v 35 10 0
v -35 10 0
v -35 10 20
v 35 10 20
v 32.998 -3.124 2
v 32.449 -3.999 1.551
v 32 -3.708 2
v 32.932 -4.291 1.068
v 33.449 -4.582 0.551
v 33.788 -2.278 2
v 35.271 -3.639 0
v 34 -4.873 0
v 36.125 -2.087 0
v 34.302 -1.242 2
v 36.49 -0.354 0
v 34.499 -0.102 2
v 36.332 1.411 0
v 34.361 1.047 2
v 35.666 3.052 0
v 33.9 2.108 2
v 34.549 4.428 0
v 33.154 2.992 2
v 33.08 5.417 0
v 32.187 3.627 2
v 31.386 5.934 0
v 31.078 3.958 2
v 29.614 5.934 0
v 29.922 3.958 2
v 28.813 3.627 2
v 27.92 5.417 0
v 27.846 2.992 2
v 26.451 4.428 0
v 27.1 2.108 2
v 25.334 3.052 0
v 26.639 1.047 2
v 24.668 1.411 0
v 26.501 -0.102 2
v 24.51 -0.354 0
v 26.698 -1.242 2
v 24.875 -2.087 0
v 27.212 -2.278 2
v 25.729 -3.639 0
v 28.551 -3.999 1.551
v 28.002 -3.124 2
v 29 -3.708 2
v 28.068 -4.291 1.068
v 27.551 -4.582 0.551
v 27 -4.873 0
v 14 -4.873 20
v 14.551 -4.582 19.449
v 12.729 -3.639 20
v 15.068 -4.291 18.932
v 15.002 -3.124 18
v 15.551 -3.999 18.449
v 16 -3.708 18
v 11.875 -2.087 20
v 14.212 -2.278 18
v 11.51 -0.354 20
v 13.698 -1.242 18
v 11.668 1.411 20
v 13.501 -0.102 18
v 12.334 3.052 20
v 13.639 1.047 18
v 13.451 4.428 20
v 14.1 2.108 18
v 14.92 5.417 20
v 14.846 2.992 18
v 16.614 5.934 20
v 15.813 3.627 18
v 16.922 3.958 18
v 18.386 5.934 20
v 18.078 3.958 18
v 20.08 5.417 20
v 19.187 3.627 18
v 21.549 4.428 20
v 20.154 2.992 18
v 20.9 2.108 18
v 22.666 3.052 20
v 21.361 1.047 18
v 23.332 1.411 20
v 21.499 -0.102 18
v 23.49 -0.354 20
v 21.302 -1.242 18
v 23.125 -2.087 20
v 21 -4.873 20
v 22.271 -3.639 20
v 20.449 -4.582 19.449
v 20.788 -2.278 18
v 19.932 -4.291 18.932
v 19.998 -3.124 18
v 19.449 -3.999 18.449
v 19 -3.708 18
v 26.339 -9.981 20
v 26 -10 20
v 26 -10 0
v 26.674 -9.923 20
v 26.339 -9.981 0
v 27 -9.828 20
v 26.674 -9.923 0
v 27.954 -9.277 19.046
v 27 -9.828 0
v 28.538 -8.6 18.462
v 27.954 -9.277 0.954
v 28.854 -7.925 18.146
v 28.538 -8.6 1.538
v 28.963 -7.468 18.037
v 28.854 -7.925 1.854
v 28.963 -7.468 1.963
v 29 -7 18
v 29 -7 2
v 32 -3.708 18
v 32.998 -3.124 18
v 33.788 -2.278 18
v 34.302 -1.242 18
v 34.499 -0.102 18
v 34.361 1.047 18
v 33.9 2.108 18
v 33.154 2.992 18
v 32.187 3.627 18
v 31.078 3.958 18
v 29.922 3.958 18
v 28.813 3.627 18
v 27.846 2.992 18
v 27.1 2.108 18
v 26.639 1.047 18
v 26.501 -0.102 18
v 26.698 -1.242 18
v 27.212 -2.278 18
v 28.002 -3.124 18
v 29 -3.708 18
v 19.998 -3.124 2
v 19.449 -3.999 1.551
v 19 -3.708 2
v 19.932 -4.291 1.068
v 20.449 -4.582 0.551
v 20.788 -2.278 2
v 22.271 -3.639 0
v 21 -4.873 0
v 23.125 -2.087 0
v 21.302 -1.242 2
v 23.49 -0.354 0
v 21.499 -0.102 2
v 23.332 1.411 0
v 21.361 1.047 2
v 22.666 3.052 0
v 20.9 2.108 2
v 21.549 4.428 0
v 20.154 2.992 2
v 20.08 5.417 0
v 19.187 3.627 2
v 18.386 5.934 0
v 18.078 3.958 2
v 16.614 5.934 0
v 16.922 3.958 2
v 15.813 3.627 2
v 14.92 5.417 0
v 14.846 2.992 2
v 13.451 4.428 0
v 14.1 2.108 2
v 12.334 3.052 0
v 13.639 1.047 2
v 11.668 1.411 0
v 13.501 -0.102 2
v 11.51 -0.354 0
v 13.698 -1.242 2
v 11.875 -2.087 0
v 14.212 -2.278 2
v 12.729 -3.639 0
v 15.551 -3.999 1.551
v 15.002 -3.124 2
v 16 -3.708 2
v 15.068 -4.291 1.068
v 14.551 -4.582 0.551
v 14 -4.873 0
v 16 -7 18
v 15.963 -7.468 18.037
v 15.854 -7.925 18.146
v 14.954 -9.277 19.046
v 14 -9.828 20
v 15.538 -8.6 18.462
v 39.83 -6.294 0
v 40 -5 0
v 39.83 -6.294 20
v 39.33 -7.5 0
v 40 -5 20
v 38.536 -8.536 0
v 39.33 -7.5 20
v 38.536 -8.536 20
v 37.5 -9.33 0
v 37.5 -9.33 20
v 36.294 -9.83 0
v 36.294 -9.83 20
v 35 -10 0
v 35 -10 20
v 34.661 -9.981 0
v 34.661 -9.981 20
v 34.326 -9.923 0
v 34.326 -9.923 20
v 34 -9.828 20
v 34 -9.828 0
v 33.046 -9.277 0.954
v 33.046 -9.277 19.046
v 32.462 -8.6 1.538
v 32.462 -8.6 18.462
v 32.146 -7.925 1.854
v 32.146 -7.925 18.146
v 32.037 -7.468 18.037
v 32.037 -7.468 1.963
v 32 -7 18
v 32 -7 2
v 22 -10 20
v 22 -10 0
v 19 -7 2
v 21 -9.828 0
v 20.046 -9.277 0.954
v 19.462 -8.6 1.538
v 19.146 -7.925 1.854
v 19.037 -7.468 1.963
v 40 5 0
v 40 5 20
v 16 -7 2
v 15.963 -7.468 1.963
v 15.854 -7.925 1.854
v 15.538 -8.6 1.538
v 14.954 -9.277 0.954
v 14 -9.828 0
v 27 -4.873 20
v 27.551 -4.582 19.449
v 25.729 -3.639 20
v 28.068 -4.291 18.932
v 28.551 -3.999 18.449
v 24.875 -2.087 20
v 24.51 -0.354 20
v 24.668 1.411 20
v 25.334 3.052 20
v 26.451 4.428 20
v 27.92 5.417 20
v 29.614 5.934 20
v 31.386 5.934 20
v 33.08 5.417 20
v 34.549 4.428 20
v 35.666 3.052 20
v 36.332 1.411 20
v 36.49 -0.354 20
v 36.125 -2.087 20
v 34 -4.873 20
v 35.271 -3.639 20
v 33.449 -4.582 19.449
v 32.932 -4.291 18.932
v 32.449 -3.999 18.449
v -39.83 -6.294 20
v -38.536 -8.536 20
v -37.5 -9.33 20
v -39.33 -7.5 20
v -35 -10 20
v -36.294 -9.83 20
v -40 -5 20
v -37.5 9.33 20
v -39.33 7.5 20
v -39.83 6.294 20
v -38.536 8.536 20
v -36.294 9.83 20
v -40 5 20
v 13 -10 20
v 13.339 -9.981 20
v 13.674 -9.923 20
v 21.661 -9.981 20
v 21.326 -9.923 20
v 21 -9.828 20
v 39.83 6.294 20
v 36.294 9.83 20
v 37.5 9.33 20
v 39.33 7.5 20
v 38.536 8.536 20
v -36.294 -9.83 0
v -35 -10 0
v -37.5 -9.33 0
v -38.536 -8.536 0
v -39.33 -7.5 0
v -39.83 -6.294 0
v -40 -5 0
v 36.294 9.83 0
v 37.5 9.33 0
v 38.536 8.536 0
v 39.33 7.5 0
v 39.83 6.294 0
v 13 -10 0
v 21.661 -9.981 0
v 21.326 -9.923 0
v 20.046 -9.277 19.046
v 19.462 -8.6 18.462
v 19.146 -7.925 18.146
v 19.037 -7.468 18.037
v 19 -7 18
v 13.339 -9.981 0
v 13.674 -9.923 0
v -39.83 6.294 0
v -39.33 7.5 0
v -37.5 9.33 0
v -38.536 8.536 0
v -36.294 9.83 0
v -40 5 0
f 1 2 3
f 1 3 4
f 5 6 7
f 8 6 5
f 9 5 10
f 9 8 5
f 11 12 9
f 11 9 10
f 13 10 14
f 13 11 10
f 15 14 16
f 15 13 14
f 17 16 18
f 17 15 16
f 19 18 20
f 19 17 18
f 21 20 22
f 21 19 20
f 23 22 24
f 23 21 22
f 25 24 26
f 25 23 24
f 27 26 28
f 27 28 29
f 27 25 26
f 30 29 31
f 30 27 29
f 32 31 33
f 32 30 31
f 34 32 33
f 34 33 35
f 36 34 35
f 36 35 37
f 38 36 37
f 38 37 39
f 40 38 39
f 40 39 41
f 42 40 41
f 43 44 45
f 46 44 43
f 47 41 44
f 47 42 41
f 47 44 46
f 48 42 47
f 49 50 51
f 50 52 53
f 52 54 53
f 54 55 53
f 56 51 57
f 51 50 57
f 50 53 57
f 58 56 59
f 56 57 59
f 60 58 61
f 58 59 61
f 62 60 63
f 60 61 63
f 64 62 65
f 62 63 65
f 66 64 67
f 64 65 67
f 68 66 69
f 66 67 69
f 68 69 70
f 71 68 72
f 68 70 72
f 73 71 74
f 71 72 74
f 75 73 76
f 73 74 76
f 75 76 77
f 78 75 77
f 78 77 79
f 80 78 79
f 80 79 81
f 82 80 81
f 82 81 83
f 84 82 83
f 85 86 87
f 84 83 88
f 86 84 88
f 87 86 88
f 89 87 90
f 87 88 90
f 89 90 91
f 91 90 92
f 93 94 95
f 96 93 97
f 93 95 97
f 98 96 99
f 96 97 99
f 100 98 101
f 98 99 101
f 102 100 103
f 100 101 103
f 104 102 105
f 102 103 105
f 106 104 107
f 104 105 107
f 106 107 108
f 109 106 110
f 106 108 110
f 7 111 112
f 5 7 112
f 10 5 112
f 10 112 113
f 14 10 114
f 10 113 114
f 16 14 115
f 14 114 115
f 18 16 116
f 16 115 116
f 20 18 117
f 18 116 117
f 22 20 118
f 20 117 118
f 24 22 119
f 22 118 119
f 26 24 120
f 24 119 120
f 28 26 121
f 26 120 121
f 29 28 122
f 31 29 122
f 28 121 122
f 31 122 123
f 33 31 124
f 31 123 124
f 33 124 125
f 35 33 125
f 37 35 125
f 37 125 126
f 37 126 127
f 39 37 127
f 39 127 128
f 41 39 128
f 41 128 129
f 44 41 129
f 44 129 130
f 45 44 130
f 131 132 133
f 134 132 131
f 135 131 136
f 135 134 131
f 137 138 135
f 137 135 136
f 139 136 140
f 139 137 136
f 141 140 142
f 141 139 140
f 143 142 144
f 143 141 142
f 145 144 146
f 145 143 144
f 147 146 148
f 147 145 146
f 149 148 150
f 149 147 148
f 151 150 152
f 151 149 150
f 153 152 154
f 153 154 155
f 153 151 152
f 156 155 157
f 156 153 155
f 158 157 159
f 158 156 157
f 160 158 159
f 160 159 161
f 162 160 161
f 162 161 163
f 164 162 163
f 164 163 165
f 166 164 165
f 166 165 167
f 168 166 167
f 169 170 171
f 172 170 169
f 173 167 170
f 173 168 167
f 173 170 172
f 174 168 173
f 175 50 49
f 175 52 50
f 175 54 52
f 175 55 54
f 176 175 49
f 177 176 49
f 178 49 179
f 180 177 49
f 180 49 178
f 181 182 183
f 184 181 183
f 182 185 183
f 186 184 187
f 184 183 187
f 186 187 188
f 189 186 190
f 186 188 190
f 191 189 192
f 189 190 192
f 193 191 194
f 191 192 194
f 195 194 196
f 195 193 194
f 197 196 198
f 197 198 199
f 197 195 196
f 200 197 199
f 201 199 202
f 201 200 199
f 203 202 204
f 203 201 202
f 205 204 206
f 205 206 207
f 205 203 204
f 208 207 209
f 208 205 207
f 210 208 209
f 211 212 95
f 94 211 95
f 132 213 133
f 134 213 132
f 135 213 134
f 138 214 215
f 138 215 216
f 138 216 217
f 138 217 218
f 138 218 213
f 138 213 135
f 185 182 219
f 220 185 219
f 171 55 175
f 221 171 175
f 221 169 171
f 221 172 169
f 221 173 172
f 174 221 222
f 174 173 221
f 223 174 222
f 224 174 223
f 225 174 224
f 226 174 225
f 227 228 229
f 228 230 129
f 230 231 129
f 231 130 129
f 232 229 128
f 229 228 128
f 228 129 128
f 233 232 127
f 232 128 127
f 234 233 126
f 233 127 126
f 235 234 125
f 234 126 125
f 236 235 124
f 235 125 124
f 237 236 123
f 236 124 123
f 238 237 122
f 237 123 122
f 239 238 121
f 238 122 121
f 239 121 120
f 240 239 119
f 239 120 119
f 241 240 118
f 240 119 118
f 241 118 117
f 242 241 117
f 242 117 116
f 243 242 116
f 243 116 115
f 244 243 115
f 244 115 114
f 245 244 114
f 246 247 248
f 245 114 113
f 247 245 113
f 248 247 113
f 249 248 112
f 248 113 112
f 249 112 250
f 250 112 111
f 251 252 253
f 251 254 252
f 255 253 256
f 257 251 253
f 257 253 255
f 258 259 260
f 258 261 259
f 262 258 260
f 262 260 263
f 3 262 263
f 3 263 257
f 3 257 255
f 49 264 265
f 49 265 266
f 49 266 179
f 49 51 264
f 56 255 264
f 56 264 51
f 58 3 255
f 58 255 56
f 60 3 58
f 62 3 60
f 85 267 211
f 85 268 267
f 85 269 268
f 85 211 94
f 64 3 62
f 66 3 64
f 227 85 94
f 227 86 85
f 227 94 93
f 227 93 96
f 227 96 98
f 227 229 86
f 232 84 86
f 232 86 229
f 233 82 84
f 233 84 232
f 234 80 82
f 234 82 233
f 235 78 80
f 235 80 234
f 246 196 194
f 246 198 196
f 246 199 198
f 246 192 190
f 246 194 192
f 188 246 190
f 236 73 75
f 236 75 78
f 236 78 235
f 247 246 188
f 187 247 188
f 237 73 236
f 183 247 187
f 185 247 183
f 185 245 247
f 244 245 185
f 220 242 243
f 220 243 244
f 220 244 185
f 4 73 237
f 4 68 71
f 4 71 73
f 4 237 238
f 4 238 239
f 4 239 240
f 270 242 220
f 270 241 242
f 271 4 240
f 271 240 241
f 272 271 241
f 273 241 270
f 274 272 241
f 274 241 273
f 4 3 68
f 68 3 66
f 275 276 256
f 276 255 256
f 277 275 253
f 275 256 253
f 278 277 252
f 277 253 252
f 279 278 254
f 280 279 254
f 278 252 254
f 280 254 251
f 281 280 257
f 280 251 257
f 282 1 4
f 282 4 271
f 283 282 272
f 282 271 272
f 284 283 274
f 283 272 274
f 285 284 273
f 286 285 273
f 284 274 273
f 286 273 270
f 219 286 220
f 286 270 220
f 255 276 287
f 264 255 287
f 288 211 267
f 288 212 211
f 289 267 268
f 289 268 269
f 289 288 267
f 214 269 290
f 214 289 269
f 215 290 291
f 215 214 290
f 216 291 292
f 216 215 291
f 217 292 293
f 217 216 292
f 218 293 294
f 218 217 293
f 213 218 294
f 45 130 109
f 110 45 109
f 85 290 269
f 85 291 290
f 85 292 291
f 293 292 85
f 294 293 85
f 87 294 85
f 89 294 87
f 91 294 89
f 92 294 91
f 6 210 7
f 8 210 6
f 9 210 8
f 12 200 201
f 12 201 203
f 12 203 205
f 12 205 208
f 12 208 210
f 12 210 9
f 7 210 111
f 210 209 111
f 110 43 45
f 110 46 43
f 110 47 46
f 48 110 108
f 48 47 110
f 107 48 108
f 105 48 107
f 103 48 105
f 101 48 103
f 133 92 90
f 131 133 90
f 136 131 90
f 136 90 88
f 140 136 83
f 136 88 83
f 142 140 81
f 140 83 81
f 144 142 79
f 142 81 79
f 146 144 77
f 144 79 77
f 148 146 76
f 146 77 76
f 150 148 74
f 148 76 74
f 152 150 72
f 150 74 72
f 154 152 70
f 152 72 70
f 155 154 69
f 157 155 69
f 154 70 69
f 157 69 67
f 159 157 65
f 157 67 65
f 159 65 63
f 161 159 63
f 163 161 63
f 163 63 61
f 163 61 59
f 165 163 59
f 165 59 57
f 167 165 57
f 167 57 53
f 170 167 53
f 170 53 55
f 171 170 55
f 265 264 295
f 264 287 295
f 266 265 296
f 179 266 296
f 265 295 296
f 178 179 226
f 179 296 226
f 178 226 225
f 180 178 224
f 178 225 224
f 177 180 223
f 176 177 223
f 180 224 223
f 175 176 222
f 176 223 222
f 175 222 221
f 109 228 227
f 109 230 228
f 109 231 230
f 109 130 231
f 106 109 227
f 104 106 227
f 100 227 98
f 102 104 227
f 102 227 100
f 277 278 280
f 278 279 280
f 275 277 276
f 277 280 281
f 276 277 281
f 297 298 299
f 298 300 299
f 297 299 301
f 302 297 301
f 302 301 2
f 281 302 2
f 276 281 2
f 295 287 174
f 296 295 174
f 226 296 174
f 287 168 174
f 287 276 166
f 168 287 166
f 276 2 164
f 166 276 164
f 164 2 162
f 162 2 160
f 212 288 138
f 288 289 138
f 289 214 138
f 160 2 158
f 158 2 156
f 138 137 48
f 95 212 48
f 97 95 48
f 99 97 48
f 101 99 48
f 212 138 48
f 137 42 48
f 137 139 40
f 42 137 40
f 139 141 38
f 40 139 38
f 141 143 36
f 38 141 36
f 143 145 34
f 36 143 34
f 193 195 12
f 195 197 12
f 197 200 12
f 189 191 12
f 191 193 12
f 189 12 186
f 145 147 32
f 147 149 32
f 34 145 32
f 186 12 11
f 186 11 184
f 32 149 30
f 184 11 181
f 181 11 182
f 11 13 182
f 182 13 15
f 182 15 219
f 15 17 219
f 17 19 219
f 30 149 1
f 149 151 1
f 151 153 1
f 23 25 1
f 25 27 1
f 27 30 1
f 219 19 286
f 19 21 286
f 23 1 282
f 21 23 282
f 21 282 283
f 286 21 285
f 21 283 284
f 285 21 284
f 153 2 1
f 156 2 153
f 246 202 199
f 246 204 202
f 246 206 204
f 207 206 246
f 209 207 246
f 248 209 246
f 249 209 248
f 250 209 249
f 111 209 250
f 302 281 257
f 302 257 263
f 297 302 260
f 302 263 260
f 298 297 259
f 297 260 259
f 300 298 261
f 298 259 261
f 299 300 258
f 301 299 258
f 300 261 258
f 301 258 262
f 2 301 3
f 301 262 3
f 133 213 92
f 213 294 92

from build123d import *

# Parameters (mm, degrees)
F0_W     = 80
F0_H     = 20
F1_DEPTH = 20
F3_DEPTH = 20.001
F4_R     = 4
F5_DEPTH = 20.001
F6_SIZE  = 2
F7_R     = 3
F8_R     = 4.99999


# Not quite as in the source:
# - a fillet or chamfer is up to 0.001 mm smaller than in the source, because OpenCascade refuses the exact size


with BuildPart() as f1:
    # F0 (on Top) → F1 (new body)
    with BuildSketch(Plane.XY):
        Rectangle(F0_W, F0_H)
    extrude(amount=F1_DEPTH)

    # F2 (on face) → F3 (cut, through all)
    with BuildSketch(Plane.XY.offset(20)):
        with BuildLine():
            Line((29, -10), (32, -10))
            Line((32, -10), (32, 0))
            ThreePointArc((32, 0), (30.5, 1.5), (29, 0))
            Line((29, 0), (29, -10))
        make_face()
        with BuildLine():
            Line((16, -10), (19, -10))
            Line((19, -10), (19, 0))
            ThreePointArc((19, 0), (17.5, 1.5), (16, 0))
            Line((16, 0), (16, -10))
        make_face()
    extrude(amount=-F3_DEPTH, mode=Mode.SUBTRACT)

    # F4 (on face) → F5 (cut, through all)
    with BuildSketch(Plane.XY.offset(20)):
        with Locations((17.5, 0)):
            Circle(F4_R)
        with Locations((30.5, 0)):
            Circle(F4_R)
    extrude(amount=-F5_DEPTH, mode=Mode.SUBTRACT)

    # F6
    f6_edges = [f1.edges().sort_by_distance(p)[0] for p in [
        (17.5, 4, 20),
        (30.5, 4, 20),
        (17.5, 4, 0),
        (30.5, 4, 0),
        (16, -6.85405, 20),
        (19, -6.85405, 20),
        (29, -6.85405, 20),
        (32, -6.85405, 20),
        (16, -6.85405, 0),
        (19, -6.85405, 0),
        (29, -6.85405, 0),
        (32, -6.85405, 0),
    ]]
    chamfer(f6_edges, length=F6_SIZE)

    # F7
    f7_edges = [f1.edges().sort_by_distance(p)[0] for p in [
        (19, -10, 10),
        (29, -10, 10),
        (32, -10, 10),
        (16, -10, 10),
    ]]
    fillet(f7_edges, radius=F7_R)

    # F8 (radius 5 in the source; OpenCascade refuses exactly that, so slightly less here)
    f8_edges = [f1.edges().sort_by_distance(p)[0] for p in [
        (40, -10, 10),
        (40, 10, 10),
        (-40, 10, 10),
        (-40, -10, 10),
    ]]
    fillet(f8_edges, radius=F8_R)


solid = f1.part
